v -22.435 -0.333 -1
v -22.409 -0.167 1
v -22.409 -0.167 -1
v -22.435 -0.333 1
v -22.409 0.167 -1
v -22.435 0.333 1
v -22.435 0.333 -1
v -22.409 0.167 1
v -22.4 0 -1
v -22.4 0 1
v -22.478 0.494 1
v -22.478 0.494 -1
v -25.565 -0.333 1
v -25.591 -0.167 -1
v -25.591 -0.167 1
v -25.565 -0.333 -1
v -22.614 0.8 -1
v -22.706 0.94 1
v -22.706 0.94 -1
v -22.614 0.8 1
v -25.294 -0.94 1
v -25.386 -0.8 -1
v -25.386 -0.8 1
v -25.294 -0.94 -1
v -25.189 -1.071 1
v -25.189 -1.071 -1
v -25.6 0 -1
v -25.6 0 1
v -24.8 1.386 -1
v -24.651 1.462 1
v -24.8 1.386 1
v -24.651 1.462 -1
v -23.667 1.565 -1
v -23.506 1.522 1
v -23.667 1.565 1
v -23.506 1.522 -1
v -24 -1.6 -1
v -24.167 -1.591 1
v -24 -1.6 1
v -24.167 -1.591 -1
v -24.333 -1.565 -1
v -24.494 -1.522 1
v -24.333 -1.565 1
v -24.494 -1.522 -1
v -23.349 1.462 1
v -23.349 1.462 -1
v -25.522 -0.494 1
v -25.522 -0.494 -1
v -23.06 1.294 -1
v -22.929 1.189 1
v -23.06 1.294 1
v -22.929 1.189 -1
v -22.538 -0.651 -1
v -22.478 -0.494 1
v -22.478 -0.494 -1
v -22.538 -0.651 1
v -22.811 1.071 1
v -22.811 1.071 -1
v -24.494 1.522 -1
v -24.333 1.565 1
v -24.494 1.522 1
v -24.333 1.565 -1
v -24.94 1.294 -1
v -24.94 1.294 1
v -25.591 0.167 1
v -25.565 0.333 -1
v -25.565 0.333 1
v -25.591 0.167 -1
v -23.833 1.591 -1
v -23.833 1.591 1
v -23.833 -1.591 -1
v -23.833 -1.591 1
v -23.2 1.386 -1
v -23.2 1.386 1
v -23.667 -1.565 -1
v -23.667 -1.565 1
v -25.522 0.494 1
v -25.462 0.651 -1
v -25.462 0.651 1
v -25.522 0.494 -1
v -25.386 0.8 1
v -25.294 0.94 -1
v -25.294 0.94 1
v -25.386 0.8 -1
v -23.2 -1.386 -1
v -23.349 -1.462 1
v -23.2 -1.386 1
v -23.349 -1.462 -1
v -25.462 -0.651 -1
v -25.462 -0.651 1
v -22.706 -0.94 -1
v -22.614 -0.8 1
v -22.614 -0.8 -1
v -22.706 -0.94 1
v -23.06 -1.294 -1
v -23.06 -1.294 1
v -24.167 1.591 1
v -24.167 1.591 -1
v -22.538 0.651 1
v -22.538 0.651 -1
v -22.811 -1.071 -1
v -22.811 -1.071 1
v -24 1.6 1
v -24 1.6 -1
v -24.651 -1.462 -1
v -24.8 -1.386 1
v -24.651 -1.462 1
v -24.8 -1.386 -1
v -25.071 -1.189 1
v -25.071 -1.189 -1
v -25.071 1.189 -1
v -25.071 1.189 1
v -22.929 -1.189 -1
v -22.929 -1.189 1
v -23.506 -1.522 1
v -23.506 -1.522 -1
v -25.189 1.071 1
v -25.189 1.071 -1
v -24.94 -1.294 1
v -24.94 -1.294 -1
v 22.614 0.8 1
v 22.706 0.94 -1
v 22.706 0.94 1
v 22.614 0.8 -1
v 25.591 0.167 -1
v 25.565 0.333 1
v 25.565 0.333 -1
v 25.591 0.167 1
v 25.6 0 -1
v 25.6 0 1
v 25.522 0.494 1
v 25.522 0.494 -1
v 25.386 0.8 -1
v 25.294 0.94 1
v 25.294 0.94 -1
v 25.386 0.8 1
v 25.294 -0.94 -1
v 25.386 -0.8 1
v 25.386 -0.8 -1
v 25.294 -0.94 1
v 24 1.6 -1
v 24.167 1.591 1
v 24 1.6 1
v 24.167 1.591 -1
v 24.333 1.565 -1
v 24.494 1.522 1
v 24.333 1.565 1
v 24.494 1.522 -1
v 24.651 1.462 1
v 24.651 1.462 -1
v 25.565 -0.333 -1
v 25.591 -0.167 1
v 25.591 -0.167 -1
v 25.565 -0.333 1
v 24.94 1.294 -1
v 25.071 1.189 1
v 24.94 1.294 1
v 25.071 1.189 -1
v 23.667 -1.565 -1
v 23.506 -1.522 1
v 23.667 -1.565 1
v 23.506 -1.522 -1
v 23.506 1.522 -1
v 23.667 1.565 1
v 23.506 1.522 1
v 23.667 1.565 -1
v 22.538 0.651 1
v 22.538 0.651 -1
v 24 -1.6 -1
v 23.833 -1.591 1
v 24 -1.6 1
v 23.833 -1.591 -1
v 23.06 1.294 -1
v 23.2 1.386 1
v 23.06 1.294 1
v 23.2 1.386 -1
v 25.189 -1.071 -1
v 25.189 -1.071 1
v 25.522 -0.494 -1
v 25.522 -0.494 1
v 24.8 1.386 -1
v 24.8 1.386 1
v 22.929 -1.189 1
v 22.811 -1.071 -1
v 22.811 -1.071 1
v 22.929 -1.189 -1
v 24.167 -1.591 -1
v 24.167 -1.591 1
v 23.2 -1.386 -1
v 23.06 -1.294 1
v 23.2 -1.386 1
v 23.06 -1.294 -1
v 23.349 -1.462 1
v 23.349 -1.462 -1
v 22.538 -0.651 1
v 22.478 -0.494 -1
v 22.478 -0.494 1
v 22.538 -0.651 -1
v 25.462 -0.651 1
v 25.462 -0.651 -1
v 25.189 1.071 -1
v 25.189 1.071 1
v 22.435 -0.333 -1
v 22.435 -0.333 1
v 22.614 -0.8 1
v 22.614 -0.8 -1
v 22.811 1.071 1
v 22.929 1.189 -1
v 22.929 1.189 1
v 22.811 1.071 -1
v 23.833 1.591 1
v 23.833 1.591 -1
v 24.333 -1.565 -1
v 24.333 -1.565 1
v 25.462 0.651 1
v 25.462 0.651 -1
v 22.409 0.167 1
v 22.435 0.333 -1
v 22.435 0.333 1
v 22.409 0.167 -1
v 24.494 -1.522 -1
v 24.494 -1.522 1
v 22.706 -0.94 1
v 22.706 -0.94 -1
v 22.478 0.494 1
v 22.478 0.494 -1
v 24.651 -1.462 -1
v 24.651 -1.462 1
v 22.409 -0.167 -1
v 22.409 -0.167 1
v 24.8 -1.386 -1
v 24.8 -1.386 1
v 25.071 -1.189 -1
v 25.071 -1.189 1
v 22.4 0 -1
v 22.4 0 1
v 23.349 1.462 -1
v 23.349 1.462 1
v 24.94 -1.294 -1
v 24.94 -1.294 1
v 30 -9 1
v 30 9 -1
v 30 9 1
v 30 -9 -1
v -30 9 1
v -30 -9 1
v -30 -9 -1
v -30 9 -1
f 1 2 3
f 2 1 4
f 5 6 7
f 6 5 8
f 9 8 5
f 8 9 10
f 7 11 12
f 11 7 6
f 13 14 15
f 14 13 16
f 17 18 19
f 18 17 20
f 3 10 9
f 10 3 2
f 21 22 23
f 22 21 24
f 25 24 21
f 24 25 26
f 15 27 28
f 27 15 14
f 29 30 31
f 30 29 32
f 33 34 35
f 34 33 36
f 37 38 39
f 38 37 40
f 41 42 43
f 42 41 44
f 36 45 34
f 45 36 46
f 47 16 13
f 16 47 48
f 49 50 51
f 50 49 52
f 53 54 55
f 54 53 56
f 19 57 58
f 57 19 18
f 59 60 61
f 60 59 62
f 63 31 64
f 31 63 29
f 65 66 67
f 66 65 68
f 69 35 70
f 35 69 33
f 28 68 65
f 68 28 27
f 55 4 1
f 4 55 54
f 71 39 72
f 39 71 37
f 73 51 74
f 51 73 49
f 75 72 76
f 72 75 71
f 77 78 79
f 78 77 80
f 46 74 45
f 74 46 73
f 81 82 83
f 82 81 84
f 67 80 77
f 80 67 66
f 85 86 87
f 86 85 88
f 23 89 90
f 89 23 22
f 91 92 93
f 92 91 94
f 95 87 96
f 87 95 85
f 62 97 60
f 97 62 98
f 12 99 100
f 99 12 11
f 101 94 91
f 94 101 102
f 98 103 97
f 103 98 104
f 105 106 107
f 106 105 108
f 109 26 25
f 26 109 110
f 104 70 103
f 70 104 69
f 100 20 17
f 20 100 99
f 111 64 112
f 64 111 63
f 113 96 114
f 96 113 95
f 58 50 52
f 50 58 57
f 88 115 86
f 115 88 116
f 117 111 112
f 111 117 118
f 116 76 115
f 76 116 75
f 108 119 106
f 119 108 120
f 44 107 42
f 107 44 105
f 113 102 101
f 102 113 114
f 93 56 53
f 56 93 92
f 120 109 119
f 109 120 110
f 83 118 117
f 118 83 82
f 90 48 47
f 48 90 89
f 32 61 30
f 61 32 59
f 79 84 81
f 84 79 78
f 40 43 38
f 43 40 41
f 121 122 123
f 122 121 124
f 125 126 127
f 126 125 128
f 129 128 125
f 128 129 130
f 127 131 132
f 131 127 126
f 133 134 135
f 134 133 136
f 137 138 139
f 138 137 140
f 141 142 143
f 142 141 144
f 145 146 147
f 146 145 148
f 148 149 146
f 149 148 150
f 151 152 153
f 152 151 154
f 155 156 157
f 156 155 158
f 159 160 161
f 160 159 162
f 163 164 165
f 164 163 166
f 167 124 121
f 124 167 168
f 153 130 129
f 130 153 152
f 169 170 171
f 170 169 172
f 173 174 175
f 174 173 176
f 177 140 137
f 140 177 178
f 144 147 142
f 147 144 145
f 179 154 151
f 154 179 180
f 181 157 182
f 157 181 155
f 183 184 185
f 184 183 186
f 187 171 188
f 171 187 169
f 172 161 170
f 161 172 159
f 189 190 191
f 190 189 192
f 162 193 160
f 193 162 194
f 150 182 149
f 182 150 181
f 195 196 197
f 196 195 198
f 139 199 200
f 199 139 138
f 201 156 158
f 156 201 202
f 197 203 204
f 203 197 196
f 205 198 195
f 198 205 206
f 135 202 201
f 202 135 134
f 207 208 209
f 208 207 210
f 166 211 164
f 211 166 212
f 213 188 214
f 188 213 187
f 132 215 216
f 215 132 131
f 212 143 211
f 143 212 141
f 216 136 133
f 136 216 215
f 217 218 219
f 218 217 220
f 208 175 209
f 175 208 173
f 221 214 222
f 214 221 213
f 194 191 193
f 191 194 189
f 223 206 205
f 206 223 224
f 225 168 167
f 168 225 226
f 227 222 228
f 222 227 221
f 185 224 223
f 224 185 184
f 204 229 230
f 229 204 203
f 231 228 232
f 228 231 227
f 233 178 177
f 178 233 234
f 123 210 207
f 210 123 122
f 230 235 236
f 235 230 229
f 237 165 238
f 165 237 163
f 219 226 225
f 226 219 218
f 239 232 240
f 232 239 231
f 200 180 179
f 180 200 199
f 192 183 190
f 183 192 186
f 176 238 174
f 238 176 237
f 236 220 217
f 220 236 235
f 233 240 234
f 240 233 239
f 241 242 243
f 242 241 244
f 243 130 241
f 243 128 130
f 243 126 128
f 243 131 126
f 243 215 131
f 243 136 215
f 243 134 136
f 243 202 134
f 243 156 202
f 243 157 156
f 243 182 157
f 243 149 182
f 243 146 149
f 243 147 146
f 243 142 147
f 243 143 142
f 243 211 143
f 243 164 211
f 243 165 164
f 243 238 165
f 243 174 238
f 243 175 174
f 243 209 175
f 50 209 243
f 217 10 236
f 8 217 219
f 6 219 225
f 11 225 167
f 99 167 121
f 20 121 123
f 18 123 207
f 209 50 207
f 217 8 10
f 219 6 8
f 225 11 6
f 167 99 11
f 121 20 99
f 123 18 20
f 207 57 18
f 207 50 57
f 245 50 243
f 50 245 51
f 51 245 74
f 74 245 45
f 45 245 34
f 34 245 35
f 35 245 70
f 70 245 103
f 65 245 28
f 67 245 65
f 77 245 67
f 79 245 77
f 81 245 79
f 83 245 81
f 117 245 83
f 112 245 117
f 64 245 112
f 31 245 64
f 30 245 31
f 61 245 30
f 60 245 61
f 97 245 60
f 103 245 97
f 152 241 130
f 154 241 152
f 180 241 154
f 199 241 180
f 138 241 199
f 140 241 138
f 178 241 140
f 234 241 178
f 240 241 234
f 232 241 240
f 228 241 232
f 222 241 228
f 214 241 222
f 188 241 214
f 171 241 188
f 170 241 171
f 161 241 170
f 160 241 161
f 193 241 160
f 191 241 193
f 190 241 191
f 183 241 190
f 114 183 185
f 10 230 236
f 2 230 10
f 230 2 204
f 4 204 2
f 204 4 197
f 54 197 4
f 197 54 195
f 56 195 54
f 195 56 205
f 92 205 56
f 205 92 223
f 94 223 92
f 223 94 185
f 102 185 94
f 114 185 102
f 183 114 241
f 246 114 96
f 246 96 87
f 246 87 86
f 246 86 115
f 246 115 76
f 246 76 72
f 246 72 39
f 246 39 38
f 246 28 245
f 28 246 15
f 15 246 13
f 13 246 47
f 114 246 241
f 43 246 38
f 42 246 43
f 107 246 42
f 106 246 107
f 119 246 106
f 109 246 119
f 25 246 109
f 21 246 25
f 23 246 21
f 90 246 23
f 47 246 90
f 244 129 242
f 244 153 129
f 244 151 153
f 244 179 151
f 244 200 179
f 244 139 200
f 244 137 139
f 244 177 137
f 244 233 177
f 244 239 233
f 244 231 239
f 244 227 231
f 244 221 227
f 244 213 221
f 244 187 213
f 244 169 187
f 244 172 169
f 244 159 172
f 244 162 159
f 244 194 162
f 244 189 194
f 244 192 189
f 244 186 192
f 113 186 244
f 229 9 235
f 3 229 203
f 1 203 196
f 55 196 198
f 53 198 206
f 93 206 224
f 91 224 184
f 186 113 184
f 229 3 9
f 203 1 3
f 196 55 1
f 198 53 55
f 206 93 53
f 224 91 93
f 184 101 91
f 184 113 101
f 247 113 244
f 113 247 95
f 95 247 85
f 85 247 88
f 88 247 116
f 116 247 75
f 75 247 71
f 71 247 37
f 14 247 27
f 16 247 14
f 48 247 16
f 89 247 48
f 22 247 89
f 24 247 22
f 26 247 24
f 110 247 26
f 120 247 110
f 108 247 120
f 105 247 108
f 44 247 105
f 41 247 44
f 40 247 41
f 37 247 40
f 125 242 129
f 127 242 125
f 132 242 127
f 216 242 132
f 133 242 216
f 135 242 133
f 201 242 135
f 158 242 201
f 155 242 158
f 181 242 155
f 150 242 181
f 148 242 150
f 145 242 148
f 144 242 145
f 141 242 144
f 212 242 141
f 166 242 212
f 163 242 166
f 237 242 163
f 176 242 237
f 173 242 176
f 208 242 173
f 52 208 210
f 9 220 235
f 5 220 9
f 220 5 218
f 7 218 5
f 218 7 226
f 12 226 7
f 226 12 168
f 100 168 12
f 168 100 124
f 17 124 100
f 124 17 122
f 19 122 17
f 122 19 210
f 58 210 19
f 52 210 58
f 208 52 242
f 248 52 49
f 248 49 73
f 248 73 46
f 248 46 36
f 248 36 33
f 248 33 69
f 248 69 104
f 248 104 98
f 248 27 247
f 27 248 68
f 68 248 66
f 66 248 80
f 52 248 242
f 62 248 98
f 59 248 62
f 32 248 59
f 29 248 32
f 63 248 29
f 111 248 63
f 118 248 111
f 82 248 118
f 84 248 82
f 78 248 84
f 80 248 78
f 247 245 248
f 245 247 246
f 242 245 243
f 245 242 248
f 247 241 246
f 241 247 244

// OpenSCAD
// Engraving-ready nameplate.
$fn = 60;
eps = 0.02;
length = 60;
width = 18;
thickness = 2;
difference() { cube([length,width,thickness],center=true); for(x=[-length/2+6,length/2-6]) translate([x,0,-thickness/2-eps]) cylinder(d=3.2,h=thickness+2*eps); }
